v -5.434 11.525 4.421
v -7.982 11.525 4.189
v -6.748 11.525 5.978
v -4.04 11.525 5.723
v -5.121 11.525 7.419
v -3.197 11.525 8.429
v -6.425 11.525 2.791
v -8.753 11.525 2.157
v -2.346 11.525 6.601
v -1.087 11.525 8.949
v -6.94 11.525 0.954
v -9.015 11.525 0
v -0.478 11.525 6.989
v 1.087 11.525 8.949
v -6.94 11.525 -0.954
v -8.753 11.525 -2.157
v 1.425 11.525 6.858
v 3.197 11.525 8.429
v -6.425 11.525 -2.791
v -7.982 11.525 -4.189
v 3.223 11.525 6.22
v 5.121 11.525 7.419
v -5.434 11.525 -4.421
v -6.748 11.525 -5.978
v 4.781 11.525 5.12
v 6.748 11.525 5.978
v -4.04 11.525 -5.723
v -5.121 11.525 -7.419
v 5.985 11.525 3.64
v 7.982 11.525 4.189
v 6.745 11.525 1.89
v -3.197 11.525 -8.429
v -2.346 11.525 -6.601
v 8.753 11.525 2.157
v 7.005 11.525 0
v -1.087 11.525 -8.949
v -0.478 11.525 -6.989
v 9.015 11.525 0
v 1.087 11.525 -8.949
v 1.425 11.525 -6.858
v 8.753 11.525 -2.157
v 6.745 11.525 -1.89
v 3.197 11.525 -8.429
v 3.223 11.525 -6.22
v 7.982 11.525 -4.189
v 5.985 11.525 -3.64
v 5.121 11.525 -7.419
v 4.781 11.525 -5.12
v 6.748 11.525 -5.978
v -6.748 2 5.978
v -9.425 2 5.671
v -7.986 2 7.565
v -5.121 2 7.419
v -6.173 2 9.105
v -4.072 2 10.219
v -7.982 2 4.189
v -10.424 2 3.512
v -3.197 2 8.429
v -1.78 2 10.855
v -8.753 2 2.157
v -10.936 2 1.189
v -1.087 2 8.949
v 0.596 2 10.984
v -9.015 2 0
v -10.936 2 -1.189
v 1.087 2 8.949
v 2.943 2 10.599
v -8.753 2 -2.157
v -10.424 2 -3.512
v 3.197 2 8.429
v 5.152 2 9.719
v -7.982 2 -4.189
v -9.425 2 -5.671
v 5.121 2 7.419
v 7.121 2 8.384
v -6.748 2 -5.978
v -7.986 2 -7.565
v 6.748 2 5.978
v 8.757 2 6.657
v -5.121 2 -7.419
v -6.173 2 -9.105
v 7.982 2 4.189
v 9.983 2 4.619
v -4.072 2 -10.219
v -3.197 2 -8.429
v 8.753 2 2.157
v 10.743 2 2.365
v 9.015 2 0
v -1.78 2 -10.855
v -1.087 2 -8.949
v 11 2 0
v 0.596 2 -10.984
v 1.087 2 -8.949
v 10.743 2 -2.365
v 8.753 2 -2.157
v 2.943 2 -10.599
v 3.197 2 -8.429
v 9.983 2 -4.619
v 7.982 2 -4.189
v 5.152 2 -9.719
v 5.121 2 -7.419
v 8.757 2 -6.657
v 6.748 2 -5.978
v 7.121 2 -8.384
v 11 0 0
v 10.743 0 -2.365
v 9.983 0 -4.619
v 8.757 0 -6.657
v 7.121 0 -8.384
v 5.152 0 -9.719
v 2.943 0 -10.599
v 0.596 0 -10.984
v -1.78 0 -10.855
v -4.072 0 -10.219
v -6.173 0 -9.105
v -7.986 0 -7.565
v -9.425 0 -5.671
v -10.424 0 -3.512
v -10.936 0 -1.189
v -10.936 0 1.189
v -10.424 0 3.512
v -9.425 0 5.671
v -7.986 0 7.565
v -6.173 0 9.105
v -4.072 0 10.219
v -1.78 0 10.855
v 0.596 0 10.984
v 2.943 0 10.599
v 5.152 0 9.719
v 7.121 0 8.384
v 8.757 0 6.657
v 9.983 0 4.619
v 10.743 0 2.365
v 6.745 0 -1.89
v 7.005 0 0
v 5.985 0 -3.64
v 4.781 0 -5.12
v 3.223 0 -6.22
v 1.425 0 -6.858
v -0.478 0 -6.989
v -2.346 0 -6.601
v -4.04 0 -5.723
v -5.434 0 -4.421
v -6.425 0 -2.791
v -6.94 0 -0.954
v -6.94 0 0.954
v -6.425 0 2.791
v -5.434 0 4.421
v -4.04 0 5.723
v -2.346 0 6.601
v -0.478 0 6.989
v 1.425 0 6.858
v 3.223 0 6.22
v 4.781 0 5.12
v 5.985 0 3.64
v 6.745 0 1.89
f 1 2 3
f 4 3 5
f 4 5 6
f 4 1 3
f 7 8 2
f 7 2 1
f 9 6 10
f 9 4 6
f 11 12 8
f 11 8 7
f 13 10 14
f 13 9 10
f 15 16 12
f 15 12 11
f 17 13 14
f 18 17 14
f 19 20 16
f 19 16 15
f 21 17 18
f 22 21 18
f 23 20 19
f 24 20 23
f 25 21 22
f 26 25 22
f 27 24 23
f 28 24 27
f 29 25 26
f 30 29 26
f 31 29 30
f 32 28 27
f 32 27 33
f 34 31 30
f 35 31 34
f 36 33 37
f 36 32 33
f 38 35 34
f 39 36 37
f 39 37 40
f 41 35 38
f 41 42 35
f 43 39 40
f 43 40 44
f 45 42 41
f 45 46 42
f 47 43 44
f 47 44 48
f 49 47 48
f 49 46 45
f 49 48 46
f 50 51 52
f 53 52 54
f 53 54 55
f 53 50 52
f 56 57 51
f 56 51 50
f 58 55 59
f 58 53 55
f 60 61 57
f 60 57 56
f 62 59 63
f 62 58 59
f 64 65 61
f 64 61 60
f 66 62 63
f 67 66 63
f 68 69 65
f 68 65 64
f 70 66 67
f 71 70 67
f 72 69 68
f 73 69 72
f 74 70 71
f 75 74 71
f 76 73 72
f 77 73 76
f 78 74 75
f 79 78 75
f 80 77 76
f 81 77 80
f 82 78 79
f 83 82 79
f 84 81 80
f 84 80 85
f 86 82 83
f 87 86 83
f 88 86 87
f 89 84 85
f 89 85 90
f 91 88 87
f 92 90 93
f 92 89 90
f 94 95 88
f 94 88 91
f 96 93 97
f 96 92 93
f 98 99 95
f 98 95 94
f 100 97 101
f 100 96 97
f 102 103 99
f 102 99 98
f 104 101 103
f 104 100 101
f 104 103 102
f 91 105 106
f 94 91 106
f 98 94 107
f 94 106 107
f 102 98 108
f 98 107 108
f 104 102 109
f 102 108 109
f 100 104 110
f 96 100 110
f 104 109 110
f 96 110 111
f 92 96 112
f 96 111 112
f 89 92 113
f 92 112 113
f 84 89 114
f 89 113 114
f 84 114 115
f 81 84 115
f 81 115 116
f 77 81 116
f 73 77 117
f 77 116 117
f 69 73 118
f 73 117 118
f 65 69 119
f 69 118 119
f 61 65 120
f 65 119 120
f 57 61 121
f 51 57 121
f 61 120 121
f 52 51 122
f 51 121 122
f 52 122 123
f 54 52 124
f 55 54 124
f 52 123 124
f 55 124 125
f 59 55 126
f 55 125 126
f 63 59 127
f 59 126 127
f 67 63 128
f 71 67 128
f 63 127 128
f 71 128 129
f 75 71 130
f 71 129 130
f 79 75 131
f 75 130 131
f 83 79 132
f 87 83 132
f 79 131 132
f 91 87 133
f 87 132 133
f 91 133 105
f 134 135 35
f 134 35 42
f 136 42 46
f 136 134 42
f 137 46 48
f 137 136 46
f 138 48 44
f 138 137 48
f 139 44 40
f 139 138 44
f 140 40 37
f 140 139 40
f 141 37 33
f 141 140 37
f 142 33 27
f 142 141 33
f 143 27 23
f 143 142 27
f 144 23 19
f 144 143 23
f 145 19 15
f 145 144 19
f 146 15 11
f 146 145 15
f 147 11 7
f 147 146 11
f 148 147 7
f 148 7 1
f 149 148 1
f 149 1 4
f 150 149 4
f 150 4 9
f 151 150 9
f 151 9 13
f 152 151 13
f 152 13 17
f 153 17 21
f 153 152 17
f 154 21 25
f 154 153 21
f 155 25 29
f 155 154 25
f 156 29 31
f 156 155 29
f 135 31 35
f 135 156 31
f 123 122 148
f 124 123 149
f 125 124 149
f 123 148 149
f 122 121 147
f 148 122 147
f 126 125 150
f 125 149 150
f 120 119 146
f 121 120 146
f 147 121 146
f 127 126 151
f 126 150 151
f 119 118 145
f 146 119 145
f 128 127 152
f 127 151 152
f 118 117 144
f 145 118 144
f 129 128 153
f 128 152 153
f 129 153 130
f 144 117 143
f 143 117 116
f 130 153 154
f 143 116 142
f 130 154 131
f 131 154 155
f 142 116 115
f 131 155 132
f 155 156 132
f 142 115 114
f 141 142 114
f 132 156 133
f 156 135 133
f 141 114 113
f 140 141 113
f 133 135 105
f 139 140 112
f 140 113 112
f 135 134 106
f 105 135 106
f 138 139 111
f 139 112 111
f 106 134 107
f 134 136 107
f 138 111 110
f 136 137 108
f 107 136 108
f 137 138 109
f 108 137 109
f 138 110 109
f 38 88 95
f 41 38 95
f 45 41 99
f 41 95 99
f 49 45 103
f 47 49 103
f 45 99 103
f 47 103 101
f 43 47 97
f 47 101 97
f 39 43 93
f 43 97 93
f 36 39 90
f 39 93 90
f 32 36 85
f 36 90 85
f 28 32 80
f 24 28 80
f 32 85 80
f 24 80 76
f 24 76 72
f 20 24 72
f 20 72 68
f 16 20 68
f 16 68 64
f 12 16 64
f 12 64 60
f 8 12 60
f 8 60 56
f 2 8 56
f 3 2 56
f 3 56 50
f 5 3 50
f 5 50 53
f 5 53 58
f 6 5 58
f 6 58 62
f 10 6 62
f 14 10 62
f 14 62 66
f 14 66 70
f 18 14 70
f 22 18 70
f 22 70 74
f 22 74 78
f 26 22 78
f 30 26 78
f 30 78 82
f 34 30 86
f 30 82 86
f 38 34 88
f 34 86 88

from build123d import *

# Parameters (mm, degrees)
SKETCH2_R           = 9.015
SKETCH2_R_2         = 7.005
BOSS_EXTRUDE1_DEPTH = 14
SKETCH3_R           = 11
SKETCH3_R_2         = 9.015
BOSS_EXTRUDE2_DEPTH = 2
CUT_EXTRUDE1_START  = -2.475
SKETCH4_R           = 9.015
CUT_EXTRUDE1_DEPTH  = 2.475


with BuildPart() as part:
    # Sketch2 → Boss-Extrude1 (new body)
    with BuildSketch(Plane(origin=(0, 0, 0), x_dir=(1, 0, 0), z_dir=(0, 1, 0))):
        Circle(SKETCH2_R)
        Circle(SKETCH2_R_2, mode=Mode.SUBTRACT)
    extrude(amount=BOSS_EXTRUDE1_DEPTH)

    # Sketch3 → Boss-Extrude2 (add)
    with BuildSketch(Plane(origin=(0, 0, 0), x_dir=(1, 0, 0), z_dir=(0, 1, 0))):
        Circle(SKETCH3_R)
        Circle(SKETCH3_R_2, mode=Mode.SUBTRACT)
    extrude(amount=BOSS_EXTRUDE2_DEPTH)

    # Sketch4 → Cut-Extrude1 (cut)
    with BuildSketch(Plane(origin=(0, 14, 0), x_dir=(1, 0, 0), z_dir=(0, 1, 0)).offset(CUT_EXTRUDE1_START)):
        Circle(SKETCH4_R)
    extrude(amount=CUT_EXTRUDE1_DEPTH, mode=Mode.SUBTRACT)


solid = part.part
